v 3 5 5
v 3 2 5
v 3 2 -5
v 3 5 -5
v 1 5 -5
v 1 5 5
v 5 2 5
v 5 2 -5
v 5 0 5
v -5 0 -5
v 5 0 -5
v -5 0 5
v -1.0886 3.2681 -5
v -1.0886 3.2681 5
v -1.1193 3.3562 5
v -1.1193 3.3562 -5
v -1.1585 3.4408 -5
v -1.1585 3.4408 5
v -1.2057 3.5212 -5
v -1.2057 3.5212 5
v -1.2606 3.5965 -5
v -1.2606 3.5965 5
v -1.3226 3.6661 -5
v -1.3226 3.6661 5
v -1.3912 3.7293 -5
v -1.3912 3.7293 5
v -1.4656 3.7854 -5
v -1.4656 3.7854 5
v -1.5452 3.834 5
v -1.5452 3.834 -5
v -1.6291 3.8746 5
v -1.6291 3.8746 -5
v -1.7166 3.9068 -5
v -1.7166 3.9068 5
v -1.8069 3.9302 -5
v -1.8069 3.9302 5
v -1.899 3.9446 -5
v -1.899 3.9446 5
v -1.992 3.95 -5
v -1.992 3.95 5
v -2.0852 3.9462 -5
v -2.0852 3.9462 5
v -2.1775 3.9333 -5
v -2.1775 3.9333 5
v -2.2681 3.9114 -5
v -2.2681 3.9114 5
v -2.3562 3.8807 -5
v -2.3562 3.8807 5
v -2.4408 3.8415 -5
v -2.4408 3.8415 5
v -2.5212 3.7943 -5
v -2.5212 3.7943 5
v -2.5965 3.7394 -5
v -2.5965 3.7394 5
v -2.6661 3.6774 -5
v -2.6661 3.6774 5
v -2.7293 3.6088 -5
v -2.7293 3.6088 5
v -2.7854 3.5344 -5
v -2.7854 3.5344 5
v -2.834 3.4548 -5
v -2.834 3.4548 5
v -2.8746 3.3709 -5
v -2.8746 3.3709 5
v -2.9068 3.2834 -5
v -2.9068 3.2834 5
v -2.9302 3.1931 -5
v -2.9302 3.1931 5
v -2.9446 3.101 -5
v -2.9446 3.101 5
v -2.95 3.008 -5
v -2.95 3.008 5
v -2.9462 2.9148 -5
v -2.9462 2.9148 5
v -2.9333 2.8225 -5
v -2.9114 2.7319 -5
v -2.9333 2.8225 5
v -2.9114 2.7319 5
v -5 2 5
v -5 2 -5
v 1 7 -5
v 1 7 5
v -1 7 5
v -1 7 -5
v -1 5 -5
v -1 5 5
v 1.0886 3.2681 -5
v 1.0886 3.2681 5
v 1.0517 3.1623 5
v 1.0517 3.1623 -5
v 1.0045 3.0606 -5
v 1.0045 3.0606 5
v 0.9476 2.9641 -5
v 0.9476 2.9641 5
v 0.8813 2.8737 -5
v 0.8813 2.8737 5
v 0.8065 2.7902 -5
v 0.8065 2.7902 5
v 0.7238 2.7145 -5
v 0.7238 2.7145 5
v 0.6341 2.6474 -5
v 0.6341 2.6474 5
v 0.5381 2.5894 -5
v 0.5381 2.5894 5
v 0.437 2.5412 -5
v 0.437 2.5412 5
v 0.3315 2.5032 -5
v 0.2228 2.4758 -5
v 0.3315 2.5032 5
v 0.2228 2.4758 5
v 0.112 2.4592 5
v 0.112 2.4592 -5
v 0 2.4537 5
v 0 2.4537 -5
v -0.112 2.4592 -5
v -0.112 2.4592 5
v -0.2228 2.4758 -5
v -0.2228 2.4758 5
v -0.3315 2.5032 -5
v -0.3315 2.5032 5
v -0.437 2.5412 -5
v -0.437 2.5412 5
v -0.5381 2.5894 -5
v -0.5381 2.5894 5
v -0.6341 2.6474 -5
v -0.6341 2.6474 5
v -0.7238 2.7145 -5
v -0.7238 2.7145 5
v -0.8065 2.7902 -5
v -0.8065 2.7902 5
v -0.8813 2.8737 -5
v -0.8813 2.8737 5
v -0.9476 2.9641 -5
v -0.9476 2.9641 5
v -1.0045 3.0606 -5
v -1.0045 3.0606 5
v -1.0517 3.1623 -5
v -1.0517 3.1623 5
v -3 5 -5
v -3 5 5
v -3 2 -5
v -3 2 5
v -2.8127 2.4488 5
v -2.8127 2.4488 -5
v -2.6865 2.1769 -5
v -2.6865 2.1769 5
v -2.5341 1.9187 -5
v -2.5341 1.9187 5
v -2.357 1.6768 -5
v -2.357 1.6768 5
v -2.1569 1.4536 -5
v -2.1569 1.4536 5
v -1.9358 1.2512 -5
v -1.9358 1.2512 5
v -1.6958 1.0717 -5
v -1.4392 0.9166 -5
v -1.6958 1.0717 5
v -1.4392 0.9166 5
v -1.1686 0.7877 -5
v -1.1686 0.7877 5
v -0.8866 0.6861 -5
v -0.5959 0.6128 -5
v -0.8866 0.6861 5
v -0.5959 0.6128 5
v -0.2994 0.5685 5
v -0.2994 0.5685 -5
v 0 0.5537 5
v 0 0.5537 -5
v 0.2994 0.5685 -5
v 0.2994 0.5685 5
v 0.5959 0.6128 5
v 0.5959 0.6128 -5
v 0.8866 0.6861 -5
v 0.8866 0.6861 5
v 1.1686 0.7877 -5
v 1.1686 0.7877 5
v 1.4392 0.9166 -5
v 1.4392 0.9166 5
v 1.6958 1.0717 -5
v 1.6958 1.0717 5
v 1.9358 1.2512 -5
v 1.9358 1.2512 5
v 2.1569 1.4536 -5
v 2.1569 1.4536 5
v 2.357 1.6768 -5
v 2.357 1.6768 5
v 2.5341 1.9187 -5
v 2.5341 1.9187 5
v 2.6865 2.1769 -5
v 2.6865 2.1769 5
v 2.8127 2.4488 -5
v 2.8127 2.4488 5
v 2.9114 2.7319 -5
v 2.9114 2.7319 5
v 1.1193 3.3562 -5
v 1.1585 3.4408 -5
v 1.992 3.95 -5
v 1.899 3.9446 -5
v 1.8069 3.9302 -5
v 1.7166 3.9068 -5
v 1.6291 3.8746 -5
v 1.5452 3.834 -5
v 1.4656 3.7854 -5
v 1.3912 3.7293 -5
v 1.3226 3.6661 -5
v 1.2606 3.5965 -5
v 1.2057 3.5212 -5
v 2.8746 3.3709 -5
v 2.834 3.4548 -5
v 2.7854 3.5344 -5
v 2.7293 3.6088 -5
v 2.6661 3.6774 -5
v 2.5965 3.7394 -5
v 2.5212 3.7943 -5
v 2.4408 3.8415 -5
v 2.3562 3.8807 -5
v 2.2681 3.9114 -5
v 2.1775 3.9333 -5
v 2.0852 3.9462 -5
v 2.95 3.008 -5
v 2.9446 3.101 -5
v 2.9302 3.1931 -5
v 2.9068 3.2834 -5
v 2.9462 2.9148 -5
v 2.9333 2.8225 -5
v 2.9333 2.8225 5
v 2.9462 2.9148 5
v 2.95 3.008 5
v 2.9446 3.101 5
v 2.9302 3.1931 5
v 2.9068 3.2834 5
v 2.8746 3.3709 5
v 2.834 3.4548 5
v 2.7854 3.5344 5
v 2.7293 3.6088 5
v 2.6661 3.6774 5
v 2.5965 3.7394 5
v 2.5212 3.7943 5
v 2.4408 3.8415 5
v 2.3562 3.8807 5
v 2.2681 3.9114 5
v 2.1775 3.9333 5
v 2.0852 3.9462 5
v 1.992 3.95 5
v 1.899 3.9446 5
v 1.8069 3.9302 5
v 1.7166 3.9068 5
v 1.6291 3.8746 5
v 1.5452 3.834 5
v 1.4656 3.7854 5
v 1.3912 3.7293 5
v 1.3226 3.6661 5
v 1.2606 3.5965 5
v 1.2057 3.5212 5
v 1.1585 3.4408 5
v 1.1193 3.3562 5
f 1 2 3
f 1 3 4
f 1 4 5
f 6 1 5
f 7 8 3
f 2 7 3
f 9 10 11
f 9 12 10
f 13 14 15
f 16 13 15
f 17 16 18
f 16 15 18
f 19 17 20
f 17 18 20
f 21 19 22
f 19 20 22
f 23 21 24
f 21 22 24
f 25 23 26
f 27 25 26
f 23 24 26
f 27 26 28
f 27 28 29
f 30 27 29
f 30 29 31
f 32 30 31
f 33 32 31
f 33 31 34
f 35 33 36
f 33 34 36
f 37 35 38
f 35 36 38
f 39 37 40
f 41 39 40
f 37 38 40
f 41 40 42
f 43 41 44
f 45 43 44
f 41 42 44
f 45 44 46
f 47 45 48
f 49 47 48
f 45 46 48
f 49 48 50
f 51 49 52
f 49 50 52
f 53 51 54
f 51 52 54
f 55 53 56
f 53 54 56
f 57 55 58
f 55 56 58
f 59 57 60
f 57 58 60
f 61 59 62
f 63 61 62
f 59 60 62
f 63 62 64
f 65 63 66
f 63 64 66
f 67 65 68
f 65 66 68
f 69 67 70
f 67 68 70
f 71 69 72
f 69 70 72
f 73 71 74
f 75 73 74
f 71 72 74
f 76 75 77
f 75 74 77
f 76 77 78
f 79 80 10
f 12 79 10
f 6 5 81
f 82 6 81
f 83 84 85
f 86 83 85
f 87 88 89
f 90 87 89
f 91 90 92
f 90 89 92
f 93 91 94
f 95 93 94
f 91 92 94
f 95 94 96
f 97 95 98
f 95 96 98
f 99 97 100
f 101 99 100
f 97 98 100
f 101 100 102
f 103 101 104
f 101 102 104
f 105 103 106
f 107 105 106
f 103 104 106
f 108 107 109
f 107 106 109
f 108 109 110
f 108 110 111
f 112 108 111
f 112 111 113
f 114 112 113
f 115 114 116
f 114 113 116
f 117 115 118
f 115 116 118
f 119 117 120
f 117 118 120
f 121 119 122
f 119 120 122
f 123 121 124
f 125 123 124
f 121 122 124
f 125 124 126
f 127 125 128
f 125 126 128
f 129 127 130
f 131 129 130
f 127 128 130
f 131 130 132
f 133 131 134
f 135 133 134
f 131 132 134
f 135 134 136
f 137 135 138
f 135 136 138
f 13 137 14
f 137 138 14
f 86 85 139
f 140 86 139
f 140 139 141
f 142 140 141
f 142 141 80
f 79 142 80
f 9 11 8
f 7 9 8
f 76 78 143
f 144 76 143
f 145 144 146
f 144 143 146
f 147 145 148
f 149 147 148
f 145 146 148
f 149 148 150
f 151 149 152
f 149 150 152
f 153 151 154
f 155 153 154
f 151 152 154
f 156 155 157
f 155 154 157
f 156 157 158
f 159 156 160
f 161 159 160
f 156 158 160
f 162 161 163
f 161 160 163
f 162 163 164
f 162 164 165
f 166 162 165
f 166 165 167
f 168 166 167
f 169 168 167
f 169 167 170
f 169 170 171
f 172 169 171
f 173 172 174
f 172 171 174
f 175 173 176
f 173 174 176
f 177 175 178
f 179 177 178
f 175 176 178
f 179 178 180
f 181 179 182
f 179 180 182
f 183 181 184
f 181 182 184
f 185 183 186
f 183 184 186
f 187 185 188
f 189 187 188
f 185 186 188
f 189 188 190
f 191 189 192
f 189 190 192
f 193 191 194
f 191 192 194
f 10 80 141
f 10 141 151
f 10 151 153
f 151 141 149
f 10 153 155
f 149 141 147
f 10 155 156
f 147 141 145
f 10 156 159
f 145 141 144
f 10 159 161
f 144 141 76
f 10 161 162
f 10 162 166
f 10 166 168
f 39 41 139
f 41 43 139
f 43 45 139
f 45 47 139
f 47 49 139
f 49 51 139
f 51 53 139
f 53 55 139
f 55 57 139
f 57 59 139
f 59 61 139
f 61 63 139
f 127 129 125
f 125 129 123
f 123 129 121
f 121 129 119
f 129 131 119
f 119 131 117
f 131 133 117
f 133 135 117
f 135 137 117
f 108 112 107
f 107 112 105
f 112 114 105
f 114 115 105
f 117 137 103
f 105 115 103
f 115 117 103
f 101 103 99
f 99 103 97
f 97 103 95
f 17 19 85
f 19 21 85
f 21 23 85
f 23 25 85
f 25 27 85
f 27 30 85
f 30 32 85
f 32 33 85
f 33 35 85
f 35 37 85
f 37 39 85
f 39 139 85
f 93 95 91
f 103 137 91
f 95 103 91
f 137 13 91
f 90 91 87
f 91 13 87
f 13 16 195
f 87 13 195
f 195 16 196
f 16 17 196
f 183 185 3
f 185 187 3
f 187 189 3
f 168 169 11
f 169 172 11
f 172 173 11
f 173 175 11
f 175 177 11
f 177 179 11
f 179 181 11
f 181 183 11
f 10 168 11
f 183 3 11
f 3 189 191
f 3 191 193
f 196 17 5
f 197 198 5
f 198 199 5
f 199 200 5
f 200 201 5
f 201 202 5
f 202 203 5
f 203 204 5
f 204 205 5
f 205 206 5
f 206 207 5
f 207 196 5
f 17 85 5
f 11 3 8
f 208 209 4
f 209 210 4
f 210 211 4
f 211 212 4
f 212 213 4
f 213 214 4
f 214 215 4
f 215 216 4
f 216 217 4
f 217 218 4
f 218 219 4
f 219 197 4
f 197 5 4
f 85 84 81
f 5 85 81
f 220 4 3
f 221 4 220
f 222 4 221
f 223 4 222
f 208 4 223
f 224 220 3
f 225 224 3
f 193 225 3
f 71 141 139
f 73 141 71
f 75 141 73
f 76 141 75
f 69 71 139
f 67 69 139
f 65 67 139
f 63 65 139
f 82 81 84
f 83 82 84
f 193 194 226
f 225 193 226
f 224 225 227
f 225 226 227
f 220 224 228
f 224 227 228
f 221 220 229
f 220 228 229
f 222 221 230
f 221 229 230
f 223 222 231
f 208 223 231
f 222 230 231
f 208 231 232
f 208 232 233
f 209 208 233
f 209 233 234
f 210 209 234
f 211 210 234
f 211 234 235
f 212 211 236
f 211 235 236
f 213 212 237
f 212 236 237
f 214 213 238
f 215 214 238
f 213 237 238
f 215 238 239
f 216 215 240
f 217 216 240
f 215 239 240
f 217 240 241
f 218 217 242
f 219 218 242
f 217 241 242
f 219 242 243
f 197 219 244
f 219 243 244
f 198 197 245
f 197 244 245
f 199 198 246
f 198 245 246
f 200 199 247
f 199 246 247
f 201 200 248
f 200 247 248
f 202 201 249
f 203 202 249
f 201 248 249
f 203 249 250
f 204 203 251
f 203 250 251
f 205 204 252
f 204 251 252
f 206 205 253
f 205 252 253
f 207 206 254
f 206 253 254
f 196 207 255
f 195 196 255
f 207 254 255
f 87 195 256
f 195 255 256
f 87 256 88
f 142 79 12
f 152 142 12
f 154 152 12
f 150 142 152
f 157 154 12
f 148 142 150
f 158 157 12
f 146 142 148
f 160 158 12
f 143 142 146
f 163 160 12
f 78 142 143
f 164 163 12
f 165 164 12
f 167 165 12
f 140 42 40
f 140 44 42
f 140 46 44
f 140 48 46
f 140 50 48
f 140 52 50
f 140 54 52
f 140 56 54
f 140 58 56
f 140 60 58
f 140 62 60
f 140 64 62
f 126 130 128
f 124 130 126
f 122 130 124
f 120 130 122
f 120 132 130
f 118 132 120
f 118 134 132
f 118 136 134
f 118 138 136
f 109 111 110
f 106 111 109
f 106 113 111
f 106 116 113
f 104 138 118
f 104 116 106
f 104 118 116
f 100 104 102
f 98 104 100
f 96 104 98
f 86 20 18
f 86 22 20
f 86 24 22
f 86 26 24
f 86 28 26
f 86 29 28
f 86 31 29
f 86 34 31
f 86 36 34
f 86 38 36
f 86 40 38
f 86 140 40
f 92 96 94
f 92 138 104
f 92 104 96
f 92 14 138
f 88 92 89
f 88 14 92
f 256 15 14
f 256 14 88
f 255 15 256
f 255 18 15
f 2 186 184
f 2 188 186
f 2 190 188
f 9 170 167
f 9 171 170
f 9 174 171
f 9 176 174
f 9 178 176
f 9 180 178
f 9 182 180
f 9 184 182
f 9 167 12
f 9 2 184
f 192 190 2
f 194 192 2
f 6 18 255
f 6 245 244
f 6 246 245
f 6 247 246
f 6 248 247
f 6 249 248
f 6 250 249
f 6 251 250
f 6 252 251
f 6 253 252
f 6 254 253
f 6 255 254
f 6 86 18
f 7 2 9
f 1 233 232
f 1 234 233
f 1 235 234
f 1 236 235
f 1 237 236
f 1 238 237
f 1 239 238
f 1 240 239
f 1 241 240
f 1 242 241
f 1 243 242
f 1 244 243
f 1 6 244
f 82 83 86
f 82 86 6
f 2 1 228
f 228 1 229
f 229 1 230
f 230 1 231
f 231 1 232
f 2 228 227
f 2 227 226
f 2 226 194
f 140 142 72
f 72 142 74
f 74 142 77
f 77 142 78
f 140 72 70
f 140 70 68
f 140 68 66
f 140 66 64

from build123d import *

# Parameters (mm, degrees)
BOSS_EXTRUDE1_DEPTH = 5
CUT_EXTRUDE1_DEPTH  = 10


with BuildPart() as part:
    # Sketch1 → Boss-Extrude1 (new, symmetric)
    with BuildSketch(Plane.XY):
        Polygon((-5, 0), (5, 0), (5, 2), (3, 2), (3, 5), (1, 5), (1, 7), (-1, 7), (-1, 5), (-3, 5), (-3, 2), (-5, 2), align=None)
    extrude(amount=BOSS_EXTRUDE1_DEPTH, both=True)

    # Sketch2 → Cut-Extrude1 (cut)
    with BuildSketch(Plane.XY.offset(5)):
        with BuildLine():
            ThreePointArc((-2.911371351, 2.73185403), (0, 0.553674644), (2.911371351, 2.73185403))
            ThreePointArc((2.911371351, 2.73185403), (2.26814597, 3.911371351), (1.088628649, 3.26814597))
            ThreePointArc((1.088628649, 3.26814597), (0, 2.453674644), (-1.088628649, 3.26814597))
            ThreePointArc((-1.088628649, 3.26814597), (-2.26814597, 3.911371351), (-2.911371351, 2.73185403))
        make_face()
    extrude(amount=-CUT_EXTRUDE1_DEPTH, mode=Mode.SUBTRACT)


solid = part.part
